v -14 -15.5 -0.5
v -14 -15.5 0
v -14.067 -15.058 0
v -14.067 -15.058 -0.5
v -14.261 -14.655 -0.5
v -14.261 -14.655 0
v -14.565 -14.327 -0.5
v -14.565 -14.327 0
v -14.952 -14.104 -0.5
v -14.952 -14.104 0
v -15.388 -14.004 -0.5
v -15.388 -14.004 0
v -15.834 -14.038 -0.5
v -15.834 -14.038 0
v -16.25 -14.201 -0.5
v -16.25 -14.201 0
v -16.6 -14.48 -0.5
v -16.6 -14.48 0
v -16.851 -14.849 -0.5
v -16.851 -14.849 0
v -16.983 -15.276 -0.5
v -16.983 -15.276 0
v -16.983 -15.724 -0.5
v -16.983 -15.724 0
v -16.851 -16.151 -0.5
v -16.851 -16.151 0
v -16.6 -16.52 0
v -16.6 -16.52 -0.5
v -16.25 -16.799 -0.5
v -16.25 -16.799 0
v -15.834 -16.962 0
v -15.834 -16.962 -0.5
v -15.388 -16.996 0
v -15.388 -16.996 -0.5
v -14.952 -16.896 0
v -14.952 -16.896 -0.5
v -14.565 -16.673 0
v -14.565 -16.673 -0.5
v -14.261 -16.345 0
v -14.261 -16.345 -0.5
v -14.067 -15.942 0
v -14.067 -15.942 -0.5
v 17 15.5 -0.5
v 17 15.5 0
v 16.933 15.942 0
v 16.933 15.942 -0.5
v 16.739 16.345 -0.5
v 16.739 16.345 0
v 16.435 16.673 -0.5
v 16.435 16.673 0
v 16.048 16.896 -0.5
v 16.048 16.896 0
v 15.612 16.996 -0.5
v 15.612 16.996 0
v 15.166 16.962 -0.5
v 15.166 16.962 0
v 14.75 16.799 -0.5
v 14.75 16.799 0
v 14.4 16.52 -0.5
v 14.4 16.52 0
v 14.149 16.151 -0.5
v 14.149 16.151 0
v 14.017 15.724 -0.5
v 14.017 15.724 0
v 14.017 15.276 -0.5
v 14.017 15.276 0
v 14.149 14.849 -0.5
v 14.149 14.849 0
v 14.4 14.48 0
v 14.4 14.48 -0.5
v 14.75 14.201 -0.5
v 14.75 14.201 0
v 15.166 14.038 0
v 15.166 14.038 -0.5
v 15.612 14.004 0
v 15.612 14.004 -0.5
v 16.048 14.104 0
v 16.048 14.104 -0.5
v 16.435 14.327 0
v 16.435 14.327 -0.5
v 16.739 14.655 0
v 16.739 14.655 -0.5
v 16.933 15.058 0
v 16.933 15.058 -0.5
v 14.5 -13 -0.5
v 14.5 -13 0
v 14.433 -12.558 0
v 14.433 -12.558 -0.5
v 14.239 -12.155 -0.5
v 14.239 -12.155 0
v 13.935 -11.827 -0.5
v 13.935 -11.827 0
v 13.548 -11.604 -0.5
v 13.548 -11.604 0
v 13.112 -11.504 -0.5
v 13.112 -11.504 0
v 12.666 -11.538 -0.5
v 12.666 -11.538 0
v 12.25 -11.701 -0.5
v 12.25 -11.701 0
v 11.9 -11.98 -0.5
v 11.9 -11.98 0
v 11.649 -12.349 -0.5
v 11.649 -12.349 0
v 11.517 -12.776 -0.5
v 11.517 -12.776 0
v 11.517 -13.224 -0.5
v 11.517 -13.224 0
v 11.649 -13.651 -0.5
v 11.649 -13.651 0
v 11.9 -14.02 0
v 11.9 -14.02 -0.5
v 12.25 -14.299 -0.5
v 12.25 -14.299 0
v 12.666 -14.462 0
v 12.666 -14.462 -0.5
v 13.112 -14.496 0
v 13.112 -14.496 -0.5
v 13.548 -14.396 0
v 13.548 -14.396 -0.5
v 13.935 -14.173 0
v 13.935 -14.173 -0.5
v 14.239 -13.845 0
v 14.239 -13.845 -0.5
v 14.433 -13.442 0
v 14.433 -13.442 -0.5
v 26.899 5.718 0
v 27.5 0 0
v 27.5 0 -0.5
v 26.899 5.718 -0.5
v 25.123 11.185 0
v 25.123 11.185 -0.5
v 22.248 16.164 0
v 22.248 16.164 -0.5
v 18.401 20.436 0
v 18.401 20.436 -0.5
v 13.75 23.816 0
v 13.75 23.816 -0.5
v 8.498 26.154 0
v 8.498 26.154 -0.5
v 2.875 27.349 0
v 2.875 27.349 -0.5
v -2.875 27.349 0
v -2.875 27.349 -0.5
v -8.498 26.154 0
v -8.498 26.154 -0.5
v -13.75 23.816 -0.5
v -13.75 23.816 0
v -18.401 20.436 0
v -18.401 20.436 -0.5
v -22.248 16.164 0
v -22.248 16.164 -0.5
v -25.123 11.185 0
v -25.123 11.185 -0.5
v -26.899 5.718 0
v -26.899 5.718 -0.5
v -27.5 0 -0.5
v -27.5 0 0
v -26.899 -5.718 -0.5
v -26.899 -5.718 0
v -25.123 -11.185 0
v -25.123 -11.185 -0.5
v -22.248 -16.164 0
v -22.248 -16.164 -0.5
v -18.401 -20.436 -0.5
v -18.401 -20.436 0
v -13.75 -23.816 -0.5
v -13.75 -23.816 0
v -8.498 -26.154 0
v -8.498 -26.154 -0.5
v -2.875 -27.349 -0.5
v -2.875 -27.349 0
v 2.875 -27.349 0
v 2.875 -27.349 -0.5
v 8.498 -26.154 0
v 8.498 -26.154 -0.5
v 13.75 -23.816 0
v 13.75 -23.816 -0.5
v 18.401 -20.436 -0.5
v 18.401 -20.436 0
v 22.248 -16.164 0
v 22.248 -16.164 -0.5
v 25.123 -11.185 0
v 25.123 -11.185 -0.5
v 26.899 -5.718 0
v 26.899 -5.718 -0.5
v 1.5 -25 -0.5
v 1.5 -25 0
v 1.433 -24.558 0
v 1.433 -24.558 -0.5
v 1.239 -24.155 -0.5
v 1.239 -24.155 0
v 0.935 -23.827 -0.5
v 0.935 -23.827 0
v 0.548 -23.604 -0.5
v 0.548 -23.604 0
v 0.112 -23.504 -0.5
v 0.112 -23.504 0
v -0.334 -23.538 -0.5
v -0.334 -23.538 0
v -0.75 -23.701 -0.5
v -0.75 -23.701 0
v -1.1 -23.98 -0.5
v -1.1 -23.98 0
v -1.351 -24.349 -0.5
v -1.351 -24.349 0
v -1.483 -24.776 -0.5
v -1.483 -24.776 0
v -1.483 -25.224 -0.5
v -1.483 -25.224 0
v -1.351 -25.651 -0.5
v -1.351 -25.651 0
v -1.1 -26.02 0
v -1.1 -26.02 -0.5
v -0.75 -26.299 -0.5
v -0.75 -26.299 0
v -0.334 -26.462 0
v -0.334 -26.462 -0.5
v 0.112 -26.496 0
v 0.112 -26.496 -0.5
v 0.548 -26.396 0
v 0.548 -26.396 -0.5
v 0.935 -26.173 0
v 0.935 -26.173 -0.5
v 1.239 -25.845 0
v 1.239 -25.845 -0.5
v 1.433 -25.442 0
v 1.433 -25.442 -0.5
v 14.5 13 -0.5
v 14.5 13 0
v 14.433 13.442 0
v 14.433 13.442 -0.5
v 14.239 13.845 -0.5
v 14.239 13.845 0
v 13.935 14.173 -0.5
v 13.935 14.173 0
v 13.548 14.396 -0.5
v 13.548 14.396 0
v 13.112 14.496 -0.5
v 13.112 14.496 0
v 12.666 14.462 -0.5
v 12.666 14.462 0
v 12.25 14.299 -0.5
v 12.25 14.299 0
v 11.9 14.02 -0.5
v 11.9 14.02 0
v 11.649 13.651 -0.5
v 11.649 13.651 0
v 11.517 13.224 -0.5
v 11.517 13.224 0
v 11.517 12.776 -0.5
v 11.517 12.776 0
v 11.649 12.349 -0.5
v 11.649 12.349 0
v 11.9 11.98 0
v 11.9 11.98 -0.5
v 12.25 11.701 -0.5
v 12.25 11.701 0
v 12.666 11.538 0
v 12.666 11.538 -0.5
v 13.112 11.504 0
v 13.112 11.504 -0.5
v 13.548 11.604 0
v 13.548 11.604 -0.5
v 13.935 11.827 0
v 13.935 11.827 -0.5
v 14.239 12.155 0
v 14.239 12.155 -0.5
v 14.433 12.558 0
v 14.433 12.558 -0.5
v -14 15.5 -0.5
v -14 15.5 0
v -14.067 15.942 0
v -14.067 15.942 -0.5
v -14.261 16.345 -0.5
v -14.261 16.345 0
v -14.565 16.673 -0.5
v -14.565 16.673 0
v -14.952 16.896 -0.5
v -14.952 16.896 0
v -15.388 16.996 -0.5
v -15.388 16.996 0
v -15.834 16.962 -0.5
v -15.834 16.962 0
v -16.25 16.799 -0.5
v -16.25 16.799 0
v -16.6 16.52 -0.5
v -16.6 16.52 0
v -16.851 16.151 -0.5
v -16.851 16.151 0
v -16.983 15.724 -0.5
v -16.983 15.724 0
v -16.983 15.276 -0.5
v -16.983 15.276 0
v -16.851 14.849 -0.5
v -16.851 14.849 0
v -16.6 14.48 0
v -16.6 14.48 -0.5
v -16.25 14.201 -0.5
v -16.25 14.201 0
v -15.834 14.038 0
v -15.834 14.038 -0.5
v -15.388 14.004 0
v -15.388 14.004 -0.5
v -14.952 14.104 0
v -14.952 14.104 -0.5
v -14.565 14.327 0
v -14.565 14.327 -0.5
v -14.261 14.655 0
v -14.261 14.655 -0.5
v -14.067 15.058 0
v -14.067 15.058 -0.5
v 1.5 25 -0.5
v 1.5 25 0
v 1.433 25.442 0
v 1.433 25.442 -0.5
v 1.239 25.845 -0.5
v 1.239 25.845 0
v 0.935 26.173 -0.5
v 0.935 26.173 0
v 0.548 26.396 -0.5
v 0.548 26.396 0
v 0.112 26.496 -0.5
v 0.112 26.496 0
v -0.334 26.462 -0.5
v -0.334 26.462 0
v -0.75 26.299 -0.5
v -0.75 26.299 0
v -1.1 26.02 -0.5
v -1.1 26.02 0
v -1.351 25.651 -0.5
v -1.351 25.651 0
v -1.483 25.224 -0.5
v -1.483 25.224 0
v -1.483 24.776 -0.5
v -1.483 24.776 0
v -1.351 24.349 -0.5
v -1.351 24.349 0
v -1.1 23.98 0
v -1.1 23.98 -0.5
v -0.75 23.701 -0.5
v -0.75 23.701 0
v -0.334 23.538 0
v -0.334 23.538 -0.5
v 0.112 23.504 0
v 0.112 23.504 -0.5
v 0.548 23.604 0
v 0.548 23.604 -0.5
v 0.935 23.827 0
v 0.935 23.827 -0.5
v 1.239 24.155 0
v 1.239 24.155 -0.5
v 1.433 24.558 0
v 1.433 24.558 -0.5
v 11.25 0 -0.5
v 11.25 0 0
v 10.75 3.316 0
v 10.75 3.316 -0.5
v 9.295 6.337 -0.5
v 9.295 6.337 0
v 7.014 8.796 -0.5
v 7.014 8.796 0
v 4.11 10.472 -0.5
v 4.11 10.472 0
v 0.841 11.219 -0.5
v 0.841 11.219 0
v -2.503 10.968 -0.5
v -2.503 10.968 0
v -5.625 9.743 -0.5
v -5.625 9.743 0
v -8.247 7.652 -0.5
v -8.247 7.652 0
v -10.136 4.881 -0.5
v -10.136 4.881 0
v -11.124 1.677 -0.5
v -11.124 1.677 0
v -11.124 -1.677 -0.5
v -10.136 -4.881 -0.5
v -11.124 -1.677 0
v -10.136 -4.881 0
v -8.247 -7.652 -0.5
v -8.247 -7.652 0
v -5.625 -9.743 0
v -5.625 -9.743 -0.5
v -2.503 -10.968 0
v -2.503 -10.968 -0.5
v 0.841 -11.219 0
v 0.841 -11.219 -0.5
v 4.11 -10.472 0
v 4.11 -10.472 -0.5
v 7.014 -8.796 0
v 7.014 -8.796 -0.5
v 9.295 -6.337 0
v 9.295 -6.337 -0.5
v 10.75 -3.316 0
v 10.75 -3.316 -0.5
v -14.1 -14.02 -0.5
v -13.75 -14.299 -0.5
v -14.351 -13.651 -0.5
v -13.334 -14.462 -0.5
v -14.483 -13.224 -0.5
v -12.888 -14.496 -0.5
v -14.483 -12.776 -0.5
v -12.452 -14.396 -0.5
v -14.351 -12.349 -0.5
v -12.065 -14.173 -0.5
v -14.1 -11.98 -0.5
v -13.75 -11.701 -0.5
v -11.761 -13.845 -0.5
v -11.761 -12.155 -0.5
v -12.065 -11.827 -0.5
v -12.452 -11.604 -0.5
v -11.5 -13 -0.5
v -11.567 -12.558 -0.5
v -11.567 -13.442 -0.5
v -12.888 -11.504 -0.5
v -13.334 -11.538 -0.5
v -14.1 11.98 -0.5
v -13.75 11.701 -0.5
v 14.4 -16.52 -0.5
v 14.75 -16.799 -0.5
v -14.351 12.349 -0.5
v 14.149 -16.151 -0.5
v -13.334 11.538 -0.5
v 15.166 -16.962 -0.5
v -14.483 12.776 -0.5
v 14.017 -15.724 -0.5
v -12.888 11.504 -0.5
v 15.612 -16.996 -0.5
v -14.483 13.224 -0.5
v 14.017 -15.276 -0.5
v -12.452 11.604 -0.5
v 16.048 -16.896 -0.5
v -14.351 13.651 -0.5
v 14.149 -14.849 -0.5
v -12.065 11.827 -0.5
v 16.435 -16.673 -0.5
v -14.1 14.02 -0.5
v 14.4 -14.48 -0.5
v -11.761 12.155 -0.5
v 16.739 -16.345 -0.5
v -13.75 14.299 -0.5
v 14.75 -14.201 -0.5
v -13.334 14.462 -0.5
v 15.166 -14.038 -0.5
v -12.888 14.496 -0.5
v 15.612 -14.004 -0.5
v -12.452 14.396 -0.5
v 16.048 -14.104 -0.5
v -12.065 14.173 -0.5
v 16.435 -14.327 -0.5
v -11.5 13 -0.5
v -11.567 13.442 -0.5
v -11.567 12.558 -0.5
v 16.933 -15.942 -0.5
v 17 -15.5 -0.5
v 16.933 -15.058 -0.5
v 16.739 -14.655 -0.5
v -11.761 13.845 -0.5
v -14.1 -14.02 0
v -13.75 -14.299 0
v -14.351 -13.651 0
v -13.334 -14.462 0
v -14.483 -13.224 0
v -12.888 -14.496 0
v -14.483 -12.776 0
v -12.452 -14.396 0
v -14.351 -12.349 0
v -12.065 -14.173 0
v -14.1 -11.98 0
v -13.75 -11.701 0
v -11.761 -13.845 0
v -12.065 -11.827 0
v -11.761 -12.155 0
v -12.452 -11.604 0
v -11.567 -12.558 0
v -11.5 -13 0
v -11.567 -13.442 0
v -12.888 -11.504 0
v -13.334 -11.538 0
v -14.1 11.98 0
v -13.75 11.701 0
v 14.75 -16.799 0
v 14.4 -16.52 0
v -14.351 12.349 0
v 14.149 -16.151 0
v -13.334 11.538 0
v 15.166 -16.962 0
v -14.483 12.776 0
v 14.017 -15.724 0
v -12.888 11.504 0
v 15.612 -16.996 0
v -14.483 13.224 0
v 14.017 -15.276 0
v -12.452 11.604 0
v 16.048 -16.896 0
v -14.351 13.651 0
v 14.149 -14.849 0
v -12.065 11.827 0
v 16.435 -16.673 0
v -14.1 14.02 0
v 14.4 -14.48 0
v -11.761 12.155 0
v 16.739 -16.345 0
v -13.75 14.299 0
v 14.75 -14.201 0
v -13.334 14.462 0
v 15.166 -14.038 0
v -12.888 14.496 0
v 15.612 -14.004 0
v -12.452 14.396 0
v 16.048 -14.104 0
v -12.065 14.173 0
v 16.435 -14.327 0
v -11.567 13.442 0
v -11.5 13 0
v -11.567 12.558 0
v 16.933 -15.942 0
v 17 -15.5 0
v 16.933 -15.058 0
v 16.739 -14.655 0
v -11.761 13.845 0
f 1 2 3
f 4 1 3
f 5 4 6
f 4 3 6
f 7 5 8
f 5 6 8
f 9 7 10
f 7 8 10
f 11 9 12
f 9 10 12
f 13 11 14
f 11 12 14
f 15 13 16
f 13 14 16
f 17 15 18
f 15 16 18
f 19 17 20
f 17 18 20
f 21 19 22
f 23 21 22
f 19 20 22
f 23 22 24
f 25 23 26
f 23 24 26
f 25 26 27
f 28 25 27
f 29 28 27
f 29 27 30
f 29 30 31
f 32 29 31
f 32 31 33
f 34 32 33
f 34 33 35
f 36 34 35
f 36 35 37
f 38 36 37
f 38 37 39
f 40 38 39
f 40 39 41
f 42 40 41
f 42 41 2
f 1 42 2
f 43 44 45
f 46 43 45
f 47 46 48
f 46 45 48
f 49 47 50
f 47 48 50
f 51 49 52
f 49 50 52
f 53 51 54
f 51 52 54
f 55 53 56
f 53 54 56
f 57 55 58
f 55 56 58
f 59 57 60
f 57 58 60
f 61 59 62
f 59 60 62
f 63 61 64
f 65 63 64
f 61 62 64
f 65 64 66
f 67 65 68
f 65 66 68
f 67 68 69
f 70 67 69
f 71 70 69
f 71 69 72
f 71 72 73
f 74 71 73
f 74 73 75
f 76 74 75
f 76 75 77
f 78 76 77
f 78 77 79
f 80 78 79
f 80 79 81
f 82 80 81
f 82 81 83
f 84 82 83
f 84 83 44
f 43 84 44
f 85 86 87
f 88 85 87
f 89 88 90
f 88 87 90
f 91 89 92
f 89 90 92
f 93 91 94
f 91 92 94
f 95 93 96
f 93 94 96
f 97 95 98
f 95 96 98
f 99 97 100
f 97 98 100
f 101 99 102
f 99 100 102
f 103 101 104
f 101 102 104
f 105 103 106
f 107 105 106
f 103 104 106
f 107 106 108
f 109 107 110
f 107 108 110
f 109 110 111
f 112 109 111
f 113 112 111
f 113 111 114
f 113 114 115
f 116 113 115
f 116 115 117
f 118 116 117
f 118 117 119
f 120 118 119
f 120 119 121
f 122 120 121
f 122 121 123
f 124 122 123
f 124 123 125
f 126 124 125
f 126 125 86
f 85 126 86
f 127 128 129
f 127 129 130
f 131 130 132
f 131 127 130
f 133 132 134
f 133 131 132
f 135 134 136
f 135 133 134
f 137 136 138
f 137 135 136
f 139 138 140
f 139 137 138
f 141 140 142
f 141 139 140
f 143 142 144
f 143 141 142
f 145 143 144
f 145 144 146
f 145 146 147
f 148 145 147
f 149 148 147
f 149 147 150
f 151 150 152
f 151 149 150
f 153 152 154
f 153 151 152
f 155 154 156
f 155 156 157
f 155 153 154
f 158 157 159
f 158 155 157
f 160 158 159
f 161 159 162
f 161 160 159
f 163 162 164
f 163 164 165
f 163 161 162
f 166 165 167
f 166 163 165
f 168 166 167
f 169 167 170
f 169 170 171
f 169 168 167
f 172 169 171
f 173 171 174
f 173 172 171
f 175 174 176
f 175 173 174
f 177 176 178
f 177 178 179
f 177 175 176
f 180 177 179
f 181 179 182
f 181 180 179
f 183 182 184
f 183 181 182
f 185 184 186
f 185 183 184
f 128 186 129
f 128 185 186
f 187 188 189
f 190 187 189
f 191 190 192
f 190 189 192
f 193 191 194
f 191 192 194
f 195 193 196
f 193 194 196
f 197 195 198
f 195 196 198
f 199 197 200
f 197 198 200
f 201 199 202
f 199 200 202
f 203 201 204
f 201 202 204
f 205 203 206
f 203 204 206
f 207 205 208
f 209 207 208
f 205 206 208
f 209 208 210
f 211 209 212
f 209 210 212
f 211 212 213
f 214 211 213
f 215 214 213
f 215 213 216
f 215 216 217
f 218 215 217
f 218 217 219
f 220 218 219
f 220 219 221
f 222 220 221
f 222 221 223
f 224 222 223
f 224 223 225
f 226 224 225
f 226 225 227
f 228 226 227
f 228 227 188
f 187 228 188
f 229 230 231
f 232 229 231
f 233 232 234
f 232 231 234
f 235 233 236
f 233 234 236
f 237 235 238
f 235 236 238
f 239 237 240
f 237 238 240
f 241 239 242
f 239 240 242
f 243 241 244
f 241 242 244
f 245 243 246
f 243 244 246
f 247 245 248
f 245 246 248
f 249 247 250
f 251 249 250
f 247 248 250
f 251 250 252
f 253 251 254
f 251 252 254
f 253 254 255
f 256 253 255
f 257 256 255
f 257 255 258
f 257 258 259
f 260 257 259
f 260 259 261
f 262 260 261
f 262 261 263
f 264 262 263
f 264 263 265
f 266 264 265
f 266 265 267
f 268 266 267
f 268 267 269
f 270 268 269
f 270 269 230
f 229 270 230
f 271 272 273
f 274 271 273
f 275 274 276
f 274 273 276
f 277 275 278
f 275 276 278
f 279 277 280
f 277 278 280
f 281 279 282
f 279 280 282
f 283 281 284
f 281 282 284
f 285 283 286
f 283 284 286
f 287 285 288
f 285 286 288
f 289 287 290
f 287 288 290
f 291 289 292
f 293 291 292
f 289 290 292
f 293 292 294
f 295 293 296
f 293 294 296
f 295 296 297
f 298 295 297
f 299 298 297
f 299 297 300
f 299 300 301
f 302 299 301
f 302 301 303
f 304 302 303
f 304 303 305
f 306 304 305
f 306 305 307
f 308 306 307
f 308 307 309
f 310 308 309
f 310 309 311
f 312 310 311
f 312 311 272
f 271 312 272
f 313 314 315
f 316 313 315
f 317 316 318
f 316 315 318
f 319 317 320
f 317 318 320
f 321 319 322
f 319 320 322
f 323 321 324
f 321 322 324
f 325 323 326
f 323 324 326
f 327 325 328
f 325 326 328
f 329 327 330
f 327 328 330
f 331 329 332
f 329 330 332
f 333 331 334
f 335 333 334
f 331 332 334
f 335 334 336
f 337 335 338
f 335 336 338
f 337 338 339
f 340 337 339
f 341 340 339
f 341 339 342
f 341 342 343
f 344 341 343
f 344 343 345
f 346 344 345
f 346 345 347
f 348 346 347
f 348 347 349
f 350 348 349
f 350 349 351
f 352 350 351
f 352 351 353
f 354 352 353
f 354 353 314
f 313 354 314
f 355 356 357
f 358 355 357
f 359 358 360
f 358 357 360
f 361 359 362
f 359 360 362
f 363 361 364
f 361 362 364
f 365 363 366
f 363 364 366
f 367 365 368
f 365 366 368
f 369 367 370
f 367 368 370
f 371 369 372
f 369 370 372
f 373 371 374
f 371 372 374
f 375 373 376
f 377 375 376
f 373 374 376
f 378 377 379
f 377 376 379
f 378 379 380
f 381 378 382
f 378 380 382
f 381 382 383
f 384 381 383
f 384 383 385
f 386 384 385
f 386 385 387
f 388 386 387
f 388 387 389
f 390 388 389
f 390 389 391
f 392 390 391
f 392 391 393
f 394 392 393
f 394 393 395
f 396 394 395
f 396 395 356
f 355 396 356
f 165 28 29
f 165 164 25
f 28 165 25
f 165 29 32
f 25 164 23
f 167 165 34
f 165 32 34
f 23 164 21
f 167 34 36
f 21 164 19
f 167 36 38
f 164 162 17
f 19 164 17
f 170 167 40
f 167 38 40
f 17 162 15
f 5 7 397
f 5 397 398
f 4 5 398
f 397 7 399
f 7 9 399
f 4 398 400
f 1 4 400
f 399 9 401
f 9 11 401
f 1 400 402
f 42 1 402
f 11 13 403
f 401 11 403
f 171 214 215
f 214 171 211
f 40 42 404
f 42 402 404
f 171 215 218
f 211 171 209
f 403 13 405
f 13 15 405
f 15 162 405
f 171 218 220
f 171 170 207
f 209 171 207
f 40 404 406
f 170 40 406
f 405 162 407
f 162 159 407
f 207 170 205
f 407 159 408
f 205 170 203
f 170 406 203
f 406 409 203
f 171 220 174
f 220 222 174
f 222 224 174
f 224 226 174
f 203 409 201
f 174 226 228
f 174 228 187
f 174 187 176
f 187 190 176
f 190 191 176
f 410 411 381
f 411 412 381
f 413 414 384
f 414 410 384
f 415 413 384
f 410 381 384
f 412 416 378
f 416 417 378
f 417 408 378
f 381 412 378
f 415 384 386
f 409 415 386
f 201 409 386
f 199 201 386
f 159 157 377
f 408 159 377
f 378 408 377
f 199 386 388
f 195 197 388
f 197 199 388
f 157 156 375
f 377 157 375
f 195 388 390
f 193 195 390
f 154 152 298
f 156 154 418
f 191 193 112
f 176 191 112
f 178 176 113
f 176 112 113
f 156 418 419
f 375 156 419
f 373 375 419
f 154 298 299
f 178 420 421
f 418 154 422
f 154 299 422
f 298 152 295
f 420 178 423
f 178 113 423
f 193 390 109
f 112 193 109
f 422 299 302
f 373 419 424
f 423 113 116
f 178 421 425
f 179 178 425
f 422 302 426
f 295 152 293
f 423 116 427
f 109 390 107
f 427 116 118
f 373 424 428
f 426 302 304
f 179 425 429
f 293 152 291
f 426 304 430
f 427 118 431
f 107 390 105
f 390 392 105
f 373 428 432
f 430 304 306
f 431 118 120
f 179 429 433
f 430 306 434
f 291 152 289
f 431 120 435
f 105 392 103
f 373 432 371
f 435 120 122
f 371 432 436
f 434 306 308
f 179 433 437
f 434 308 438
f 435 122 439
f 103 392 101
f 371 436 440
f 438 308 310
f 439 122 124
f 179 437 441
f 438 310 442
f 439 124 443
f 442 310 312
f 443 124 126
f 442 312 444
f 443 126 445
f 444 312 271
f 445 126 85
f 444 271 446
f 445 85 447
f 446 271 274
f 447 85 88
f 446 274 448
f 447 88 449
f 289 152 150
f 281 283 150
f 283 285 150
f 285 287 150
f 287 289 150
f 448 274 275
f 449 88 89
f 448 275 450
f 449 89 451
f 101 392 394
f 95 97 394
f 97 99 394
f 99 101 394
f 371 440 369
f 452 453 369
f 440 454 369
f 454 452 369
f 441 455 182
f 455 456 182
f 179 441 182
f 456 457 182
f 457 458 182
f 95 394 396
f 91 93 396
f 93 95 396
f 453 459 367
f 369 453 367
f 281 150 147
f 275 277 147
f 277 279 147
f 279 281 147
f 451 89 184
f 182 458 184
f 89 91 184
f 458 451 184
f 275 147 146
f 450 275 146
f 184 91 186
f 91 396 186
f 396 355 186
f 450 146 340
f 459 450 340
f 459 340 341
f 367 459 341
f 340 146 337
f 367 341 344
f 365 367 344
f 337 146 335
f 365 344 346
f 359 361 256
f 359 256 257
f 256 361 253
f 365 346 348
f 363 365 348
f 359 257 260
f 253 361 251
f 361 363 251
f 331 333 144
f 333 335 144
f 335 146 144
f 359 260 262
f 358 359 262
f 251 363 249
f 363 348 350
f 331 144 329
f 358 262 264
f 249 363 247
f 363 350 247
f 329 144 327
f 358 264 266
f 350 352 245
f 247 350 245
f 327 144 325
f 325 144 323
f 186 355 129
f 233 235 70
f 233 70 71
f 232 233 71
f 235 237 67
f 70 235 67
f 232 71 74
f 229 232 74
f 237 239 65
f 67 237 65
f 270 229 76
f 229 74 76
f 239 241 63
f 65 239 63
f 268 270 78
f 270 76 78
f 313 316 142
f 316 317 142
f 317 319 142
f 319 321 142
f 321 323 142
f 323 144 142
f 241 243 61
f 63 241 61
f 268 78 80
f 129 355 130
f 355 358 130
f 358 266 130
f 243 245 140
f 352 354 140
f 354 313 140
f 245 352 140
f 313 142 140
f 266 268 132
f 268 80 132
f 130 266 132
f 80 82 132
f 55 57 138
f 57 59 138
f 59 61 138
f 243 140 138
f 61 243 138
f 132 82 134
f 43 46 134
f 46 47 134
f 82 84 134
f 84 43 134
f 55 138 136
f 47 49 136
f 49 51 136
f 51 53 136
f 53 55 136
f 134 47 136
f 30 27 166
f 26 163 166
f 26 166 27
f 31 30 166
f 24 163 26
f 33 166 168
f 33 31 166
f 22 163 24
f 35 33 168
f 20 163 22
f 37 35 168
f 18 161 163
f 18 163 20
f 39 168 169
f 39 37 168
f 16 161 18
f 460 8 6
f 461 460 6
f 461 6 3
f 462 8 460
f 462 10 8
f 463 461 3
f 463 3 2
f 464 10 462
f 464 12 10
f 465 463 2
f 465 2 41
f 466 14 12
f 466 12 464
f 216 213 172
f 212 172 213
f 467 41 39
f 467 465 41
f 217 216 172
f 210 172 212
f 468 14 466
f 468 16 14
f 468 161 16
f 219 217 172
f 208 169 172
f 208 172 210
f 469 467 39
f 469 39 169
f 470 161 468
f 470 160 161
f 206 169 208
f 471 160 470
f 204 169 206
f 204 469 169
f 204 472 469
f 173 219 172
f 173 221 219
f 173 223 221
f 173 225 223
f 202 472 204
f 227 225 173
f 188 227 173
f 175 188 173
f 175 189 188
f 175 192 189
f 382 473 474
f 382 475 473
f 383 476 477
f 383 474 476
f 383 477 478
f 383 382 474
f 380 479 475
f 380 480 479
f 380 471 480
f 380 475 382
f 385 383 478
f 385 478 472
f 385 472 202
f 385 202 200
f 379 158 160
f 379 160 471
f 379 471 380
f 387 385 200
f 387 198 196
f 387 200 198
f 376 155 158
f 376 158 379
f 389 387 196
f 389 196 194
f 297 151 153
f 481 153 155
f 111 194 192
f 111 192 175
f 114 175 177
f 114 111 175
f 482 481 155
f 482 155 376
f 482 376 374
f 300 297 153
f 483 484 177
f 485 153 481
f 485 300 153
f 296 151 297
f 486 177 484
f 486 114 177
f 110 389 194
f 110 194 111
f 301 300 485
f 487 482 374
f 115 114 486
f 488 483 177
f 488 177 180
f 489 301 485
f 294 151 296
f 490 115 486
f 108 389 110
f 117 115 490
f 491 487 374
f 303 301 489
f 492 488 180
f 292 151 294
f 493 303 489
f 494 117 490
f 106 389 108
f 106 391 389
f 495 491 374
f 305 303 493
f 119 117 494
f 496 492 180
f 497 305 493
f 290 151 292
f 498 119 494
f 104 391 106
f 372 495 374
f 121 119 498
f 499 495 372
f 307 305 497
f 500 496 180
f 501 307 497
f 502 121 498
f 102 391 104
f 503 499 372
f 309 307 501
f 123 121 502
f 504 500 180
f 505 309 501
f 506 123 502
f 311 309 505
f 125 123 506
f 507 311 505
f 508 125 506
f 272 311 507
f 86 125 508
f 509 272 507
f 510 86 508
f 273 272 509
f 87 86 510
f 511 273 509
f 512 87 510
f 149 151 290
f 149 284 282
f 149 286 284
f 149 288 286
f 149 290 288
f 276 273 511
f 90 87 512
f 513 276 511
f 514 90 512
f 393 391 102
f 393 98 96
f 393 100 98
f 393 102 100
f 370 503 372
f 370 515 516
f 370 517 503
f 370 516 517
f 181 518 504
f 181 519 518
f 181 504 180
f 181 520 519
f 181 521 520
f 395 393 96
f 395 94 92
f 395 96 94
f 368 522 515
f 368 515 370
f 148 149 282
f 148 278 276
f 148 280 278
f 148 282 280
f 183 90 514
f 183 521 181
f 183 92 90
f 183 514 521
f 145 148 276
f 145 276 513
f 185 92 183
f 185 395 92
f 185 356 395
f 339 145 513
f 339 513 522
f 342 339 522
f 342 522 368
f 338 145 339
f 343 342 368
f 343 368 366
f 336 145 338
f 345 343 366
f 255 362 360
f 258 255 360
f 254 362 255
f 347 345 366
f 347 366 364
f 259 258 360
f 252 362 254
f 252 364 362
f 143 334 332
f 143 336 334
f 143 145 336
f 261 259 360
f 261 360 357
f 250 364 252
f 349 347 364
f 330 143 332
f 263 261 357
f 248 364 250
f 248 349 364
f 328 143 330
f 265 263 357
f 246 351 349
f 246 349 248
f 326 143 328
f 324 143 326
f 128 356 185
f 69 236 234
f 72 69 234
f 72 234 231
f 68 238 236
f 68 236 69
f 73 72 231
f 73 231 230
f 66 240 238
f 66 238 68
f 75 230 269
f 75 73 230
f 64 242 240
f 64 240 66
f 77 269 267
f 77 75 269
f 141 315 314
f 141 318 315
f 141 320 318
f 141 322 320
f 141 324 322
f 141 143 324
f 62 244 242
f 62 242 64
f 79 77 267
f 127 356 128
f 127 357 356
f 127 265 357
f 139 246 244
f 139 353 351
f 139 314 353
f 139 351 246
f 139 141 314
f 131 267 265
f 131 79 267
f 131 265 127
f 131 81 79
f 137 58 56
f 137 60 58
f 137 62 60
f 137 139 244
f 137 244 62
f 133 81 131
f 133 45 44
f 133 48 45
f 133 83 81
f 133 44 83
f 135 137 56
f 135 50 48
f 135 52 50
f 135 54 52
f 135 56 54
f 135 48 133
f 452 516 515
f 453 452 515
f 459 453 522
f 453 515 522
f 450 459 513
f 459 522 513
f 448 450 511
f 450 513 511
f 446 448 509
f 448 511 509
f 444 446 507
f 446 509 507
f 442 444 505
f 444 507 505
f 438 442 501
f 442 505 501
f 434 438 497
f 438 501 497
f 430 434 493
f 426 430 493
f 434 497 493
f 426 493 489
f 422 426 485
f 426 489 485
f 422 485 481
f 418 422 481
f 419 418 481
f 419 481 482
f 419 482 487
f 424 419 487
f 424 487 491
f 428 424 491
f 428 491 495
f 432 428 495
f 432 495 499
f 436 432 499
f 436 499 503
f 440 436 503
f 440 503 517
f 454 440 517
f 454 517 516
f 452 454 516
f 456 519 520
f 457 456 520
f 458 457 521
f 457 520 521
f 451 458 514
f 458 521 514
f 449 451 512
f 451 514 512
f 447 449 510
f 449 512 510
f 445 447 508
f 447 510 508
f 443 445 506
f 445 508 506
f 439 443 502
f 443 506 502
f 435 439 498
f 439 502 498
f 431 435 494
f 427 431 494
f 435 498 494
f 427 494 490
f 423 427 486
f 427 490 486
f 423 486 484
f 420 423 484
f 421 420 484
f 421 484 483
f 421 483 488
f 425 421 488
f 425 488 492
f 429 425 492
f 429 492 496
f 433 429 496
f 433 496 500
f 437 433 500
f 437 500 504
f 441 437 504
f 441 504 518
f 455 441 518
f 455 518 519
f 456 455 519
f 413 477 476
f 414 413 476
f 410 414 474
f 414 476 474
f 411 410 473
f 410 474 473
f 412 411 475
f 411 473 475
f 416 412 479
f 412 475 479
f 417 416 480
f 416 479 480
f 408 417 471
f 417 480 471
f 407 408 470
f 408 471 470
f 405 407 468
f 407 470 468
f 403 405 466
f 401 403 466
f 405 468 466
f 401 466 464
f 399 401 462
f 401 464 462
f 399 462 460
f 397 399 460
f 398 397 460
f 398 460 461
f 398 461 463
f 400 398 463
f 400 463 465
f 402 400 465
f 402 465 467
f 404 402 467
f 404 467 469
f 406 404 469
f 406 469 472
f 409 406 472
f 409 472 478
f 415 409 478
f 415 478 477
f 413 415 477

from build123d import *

# Parameters (mm, degrees)
CROQUIS1_R            = 27.5
BRIDA_BASE1_DEPTH     = 0.5
CROQUIS6_R            = 11.25
CROQUIS6_R_2          = 1.5
CORTAR_EXTRUIR3_DEPTH = 10


# Sheet-metal steps are written as plain solids
with BuildPart() as part:
    # Croquis1 → Brida base1 (new body)
    with BuildSketch(Plane.XY):
        Circle(CROQUIS1_R)
    extrude(amount=-BRIDA_BASE1_DEPTH)

    # Croquis6 → Cortar-Extruir3 (cut)
    with BuildSketch(Plane.XY):
        Circle(CROQUIS6_R)
        with Locations((-13, 13)):
            Circle(CROQUIS6_R_2)
        with Locations((-13, -13)):
            Circle(CROQUIS6_R_2)
        with Locations((13, 13)):
            Circle(CROQUIS6_R_2)
        with Locations((0, 25)):
            Circle(CROQUIS6_R_2)
        with Locations((-15.5, 15.5)):
            Circle(CROQUIS6_R_2)
        with Locations((-15.5, -15.5)):
            Circle(CROQUIS6_R_2)
        with Locations((0, -25)):
            Circle(CROQUIS6_R_2)
        with Locations((13, -13)):
            Circle(CROQUIS6_R_2)
        with Locations((15.5, -15.5)):
            Circle(CROQUIS6_R_2)
        with Locations((15.5, 15.5)):
            Circle(CROQUIS6_R_2)
    extrude(amount=-CORTAR_EXTRUIR3_DEPTH, mode=Mode.SUBTRACT)


solid = part.part
